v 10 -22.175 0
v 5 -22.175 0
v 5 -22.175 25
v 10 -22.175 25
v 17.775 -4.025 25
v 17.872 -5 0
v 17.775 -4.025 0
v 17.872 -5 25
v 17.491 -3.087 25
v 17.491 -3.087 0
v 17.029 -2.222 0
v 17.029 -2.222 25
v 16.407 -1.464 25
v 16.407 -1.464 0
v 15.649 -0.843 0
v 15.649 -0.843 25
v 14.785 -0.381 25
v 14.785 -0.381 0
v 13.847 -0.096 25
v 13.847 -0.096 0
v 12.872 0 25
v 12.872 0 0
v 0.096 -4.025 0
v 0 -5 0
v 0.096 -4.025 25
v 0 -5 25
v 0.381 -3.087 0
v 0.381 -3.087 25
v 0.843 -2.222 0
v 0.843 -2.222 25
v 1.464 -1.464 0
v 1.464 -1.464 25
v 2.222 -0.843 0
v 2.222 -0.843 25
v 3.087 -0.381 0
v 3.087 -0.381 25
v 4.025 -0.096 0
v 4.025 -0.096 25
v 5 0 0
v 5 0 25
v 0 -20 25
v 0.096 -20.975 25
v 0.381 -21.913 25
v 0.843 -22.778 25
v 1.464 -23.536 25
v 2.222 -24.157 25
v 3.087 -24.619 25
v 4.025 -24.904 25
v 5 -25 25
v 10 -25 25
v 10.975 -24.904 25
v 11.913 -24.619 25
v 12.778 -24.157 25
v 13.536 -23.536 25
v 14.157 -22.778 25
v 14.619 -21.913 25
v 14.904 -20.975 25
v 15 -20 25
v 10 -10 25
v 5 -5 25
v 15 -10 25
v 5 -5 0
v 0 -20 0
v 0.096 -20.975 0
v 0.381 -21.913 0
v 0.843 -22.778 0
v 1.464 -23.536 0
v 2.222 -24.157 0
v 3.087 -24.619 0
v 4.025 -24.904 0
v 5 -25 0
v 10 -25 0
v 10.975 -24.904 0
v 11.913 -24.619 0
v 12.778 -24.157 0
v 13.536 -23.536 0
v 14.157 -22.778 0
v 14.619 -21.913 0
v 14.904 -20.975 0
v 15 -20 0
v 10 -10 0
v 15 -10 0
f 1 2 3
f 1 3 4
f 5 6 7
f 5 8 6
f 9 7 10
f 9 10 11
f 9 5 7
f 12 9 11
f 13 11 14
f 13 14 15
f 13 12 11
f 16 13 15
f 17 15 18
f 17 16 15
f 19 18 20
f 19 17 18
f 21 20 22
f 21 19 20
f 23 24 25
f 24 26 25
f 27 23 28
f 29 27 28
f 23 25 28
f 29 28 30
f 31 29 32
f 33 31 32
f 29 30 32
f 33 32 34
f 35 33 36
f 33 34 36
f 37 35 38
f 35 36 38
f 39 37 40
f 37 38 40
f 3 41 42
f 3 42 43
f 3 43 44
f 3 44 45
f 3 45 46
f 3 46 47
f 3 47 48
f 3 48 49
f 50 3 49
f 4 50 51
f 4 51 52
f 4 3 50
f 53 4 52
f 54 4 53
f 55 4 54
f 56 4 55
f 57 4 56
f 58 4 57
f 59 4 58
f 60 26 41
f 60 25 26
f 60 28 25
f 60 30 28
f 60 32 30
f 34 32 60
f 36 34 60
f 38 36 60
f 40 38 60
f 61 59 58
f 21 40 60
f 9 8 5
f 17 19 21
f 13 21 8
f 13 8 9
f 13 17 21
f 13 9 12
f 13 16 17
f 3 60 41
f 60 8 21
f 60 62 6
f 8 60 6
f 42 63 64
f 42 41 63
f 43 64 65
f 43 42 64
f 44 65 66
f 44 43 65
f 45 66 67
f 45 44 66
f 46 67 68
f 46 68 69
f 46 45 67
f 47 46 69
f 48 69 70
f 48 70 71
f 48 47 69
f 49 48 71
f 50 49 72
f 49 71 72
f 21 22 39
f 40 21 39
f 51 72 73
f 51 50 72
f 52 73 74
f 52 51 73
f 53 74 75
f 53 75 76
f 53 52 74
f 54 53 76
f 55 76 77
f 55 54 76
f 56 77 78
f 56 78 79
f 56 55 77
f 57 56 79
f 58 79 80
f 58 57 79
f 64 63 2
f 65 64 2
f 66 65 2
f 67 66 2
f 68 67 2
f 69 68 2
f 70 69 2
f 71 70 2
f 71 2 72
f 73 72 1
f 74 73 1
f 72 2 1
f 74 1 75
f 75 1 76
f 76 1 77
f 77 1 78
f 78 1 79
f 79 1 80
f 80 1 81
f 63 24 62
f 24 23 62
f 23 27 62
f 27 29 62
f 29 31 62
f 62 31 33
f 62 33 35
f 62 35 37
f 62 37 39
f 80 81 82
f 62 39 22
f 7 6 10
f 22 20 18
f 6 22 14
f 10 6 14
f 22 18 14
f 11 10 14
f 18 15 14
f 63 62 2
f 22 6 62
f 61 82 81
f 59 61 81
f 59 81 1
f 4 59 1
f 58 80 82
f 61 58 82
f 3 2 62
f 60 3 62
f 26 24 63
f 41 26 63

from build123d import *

# Parameters (mm, degrees)
F0_W     = 5
F0_H     = 5
F0_W_2   = 12.8715214133
F0_H_2   = 2.8254000843
F1_DEPTH = 25
F2_R     = 4.99999


# Not quite as in the source:
# - a fillet or chamfer is up to 0.001 mm smaller than in the source, because OpenCascade refuses the exact size


with BuildPart() as f1:
    # F0 (on Top) → F1 (new body)
    with BuildSketch(Plane.XY):
        with Locations((2.5, -2.5)):
            Rectangle(F0_W, F0_H)
        with Locations((11.4357607067, -2.5)):
            Rectangle(F0_W_2, F0_H)
        Polygon((5, -5), (0, -5), (0, -25), (5, -25), (5, -22.1745999157), align=None)
        with Locations((7.5, -23.5872999579)):
            Rectangle(F0_W, F0_H_2)
        Polygon((10, -10), (10, -22.1745999157), (10, -25), (15, -25), (15, -10), align=None)
    extrude(amount=F1_DEPTH)

    # F2 (radius 5 in the source; OpenCascade refuses exactly that, so slightly less here)
    f2_edges = [f1.edges().sort_by_distance(p)[0] for p in [
        (0, 0, 12.5),
        (0, -25, 12.5),
        (15, -25, 12.5),
        (17.871521, 0, 12.5),
    ]]
    fillet(f2_edges, radius=F2_R)


solid = f1.part
